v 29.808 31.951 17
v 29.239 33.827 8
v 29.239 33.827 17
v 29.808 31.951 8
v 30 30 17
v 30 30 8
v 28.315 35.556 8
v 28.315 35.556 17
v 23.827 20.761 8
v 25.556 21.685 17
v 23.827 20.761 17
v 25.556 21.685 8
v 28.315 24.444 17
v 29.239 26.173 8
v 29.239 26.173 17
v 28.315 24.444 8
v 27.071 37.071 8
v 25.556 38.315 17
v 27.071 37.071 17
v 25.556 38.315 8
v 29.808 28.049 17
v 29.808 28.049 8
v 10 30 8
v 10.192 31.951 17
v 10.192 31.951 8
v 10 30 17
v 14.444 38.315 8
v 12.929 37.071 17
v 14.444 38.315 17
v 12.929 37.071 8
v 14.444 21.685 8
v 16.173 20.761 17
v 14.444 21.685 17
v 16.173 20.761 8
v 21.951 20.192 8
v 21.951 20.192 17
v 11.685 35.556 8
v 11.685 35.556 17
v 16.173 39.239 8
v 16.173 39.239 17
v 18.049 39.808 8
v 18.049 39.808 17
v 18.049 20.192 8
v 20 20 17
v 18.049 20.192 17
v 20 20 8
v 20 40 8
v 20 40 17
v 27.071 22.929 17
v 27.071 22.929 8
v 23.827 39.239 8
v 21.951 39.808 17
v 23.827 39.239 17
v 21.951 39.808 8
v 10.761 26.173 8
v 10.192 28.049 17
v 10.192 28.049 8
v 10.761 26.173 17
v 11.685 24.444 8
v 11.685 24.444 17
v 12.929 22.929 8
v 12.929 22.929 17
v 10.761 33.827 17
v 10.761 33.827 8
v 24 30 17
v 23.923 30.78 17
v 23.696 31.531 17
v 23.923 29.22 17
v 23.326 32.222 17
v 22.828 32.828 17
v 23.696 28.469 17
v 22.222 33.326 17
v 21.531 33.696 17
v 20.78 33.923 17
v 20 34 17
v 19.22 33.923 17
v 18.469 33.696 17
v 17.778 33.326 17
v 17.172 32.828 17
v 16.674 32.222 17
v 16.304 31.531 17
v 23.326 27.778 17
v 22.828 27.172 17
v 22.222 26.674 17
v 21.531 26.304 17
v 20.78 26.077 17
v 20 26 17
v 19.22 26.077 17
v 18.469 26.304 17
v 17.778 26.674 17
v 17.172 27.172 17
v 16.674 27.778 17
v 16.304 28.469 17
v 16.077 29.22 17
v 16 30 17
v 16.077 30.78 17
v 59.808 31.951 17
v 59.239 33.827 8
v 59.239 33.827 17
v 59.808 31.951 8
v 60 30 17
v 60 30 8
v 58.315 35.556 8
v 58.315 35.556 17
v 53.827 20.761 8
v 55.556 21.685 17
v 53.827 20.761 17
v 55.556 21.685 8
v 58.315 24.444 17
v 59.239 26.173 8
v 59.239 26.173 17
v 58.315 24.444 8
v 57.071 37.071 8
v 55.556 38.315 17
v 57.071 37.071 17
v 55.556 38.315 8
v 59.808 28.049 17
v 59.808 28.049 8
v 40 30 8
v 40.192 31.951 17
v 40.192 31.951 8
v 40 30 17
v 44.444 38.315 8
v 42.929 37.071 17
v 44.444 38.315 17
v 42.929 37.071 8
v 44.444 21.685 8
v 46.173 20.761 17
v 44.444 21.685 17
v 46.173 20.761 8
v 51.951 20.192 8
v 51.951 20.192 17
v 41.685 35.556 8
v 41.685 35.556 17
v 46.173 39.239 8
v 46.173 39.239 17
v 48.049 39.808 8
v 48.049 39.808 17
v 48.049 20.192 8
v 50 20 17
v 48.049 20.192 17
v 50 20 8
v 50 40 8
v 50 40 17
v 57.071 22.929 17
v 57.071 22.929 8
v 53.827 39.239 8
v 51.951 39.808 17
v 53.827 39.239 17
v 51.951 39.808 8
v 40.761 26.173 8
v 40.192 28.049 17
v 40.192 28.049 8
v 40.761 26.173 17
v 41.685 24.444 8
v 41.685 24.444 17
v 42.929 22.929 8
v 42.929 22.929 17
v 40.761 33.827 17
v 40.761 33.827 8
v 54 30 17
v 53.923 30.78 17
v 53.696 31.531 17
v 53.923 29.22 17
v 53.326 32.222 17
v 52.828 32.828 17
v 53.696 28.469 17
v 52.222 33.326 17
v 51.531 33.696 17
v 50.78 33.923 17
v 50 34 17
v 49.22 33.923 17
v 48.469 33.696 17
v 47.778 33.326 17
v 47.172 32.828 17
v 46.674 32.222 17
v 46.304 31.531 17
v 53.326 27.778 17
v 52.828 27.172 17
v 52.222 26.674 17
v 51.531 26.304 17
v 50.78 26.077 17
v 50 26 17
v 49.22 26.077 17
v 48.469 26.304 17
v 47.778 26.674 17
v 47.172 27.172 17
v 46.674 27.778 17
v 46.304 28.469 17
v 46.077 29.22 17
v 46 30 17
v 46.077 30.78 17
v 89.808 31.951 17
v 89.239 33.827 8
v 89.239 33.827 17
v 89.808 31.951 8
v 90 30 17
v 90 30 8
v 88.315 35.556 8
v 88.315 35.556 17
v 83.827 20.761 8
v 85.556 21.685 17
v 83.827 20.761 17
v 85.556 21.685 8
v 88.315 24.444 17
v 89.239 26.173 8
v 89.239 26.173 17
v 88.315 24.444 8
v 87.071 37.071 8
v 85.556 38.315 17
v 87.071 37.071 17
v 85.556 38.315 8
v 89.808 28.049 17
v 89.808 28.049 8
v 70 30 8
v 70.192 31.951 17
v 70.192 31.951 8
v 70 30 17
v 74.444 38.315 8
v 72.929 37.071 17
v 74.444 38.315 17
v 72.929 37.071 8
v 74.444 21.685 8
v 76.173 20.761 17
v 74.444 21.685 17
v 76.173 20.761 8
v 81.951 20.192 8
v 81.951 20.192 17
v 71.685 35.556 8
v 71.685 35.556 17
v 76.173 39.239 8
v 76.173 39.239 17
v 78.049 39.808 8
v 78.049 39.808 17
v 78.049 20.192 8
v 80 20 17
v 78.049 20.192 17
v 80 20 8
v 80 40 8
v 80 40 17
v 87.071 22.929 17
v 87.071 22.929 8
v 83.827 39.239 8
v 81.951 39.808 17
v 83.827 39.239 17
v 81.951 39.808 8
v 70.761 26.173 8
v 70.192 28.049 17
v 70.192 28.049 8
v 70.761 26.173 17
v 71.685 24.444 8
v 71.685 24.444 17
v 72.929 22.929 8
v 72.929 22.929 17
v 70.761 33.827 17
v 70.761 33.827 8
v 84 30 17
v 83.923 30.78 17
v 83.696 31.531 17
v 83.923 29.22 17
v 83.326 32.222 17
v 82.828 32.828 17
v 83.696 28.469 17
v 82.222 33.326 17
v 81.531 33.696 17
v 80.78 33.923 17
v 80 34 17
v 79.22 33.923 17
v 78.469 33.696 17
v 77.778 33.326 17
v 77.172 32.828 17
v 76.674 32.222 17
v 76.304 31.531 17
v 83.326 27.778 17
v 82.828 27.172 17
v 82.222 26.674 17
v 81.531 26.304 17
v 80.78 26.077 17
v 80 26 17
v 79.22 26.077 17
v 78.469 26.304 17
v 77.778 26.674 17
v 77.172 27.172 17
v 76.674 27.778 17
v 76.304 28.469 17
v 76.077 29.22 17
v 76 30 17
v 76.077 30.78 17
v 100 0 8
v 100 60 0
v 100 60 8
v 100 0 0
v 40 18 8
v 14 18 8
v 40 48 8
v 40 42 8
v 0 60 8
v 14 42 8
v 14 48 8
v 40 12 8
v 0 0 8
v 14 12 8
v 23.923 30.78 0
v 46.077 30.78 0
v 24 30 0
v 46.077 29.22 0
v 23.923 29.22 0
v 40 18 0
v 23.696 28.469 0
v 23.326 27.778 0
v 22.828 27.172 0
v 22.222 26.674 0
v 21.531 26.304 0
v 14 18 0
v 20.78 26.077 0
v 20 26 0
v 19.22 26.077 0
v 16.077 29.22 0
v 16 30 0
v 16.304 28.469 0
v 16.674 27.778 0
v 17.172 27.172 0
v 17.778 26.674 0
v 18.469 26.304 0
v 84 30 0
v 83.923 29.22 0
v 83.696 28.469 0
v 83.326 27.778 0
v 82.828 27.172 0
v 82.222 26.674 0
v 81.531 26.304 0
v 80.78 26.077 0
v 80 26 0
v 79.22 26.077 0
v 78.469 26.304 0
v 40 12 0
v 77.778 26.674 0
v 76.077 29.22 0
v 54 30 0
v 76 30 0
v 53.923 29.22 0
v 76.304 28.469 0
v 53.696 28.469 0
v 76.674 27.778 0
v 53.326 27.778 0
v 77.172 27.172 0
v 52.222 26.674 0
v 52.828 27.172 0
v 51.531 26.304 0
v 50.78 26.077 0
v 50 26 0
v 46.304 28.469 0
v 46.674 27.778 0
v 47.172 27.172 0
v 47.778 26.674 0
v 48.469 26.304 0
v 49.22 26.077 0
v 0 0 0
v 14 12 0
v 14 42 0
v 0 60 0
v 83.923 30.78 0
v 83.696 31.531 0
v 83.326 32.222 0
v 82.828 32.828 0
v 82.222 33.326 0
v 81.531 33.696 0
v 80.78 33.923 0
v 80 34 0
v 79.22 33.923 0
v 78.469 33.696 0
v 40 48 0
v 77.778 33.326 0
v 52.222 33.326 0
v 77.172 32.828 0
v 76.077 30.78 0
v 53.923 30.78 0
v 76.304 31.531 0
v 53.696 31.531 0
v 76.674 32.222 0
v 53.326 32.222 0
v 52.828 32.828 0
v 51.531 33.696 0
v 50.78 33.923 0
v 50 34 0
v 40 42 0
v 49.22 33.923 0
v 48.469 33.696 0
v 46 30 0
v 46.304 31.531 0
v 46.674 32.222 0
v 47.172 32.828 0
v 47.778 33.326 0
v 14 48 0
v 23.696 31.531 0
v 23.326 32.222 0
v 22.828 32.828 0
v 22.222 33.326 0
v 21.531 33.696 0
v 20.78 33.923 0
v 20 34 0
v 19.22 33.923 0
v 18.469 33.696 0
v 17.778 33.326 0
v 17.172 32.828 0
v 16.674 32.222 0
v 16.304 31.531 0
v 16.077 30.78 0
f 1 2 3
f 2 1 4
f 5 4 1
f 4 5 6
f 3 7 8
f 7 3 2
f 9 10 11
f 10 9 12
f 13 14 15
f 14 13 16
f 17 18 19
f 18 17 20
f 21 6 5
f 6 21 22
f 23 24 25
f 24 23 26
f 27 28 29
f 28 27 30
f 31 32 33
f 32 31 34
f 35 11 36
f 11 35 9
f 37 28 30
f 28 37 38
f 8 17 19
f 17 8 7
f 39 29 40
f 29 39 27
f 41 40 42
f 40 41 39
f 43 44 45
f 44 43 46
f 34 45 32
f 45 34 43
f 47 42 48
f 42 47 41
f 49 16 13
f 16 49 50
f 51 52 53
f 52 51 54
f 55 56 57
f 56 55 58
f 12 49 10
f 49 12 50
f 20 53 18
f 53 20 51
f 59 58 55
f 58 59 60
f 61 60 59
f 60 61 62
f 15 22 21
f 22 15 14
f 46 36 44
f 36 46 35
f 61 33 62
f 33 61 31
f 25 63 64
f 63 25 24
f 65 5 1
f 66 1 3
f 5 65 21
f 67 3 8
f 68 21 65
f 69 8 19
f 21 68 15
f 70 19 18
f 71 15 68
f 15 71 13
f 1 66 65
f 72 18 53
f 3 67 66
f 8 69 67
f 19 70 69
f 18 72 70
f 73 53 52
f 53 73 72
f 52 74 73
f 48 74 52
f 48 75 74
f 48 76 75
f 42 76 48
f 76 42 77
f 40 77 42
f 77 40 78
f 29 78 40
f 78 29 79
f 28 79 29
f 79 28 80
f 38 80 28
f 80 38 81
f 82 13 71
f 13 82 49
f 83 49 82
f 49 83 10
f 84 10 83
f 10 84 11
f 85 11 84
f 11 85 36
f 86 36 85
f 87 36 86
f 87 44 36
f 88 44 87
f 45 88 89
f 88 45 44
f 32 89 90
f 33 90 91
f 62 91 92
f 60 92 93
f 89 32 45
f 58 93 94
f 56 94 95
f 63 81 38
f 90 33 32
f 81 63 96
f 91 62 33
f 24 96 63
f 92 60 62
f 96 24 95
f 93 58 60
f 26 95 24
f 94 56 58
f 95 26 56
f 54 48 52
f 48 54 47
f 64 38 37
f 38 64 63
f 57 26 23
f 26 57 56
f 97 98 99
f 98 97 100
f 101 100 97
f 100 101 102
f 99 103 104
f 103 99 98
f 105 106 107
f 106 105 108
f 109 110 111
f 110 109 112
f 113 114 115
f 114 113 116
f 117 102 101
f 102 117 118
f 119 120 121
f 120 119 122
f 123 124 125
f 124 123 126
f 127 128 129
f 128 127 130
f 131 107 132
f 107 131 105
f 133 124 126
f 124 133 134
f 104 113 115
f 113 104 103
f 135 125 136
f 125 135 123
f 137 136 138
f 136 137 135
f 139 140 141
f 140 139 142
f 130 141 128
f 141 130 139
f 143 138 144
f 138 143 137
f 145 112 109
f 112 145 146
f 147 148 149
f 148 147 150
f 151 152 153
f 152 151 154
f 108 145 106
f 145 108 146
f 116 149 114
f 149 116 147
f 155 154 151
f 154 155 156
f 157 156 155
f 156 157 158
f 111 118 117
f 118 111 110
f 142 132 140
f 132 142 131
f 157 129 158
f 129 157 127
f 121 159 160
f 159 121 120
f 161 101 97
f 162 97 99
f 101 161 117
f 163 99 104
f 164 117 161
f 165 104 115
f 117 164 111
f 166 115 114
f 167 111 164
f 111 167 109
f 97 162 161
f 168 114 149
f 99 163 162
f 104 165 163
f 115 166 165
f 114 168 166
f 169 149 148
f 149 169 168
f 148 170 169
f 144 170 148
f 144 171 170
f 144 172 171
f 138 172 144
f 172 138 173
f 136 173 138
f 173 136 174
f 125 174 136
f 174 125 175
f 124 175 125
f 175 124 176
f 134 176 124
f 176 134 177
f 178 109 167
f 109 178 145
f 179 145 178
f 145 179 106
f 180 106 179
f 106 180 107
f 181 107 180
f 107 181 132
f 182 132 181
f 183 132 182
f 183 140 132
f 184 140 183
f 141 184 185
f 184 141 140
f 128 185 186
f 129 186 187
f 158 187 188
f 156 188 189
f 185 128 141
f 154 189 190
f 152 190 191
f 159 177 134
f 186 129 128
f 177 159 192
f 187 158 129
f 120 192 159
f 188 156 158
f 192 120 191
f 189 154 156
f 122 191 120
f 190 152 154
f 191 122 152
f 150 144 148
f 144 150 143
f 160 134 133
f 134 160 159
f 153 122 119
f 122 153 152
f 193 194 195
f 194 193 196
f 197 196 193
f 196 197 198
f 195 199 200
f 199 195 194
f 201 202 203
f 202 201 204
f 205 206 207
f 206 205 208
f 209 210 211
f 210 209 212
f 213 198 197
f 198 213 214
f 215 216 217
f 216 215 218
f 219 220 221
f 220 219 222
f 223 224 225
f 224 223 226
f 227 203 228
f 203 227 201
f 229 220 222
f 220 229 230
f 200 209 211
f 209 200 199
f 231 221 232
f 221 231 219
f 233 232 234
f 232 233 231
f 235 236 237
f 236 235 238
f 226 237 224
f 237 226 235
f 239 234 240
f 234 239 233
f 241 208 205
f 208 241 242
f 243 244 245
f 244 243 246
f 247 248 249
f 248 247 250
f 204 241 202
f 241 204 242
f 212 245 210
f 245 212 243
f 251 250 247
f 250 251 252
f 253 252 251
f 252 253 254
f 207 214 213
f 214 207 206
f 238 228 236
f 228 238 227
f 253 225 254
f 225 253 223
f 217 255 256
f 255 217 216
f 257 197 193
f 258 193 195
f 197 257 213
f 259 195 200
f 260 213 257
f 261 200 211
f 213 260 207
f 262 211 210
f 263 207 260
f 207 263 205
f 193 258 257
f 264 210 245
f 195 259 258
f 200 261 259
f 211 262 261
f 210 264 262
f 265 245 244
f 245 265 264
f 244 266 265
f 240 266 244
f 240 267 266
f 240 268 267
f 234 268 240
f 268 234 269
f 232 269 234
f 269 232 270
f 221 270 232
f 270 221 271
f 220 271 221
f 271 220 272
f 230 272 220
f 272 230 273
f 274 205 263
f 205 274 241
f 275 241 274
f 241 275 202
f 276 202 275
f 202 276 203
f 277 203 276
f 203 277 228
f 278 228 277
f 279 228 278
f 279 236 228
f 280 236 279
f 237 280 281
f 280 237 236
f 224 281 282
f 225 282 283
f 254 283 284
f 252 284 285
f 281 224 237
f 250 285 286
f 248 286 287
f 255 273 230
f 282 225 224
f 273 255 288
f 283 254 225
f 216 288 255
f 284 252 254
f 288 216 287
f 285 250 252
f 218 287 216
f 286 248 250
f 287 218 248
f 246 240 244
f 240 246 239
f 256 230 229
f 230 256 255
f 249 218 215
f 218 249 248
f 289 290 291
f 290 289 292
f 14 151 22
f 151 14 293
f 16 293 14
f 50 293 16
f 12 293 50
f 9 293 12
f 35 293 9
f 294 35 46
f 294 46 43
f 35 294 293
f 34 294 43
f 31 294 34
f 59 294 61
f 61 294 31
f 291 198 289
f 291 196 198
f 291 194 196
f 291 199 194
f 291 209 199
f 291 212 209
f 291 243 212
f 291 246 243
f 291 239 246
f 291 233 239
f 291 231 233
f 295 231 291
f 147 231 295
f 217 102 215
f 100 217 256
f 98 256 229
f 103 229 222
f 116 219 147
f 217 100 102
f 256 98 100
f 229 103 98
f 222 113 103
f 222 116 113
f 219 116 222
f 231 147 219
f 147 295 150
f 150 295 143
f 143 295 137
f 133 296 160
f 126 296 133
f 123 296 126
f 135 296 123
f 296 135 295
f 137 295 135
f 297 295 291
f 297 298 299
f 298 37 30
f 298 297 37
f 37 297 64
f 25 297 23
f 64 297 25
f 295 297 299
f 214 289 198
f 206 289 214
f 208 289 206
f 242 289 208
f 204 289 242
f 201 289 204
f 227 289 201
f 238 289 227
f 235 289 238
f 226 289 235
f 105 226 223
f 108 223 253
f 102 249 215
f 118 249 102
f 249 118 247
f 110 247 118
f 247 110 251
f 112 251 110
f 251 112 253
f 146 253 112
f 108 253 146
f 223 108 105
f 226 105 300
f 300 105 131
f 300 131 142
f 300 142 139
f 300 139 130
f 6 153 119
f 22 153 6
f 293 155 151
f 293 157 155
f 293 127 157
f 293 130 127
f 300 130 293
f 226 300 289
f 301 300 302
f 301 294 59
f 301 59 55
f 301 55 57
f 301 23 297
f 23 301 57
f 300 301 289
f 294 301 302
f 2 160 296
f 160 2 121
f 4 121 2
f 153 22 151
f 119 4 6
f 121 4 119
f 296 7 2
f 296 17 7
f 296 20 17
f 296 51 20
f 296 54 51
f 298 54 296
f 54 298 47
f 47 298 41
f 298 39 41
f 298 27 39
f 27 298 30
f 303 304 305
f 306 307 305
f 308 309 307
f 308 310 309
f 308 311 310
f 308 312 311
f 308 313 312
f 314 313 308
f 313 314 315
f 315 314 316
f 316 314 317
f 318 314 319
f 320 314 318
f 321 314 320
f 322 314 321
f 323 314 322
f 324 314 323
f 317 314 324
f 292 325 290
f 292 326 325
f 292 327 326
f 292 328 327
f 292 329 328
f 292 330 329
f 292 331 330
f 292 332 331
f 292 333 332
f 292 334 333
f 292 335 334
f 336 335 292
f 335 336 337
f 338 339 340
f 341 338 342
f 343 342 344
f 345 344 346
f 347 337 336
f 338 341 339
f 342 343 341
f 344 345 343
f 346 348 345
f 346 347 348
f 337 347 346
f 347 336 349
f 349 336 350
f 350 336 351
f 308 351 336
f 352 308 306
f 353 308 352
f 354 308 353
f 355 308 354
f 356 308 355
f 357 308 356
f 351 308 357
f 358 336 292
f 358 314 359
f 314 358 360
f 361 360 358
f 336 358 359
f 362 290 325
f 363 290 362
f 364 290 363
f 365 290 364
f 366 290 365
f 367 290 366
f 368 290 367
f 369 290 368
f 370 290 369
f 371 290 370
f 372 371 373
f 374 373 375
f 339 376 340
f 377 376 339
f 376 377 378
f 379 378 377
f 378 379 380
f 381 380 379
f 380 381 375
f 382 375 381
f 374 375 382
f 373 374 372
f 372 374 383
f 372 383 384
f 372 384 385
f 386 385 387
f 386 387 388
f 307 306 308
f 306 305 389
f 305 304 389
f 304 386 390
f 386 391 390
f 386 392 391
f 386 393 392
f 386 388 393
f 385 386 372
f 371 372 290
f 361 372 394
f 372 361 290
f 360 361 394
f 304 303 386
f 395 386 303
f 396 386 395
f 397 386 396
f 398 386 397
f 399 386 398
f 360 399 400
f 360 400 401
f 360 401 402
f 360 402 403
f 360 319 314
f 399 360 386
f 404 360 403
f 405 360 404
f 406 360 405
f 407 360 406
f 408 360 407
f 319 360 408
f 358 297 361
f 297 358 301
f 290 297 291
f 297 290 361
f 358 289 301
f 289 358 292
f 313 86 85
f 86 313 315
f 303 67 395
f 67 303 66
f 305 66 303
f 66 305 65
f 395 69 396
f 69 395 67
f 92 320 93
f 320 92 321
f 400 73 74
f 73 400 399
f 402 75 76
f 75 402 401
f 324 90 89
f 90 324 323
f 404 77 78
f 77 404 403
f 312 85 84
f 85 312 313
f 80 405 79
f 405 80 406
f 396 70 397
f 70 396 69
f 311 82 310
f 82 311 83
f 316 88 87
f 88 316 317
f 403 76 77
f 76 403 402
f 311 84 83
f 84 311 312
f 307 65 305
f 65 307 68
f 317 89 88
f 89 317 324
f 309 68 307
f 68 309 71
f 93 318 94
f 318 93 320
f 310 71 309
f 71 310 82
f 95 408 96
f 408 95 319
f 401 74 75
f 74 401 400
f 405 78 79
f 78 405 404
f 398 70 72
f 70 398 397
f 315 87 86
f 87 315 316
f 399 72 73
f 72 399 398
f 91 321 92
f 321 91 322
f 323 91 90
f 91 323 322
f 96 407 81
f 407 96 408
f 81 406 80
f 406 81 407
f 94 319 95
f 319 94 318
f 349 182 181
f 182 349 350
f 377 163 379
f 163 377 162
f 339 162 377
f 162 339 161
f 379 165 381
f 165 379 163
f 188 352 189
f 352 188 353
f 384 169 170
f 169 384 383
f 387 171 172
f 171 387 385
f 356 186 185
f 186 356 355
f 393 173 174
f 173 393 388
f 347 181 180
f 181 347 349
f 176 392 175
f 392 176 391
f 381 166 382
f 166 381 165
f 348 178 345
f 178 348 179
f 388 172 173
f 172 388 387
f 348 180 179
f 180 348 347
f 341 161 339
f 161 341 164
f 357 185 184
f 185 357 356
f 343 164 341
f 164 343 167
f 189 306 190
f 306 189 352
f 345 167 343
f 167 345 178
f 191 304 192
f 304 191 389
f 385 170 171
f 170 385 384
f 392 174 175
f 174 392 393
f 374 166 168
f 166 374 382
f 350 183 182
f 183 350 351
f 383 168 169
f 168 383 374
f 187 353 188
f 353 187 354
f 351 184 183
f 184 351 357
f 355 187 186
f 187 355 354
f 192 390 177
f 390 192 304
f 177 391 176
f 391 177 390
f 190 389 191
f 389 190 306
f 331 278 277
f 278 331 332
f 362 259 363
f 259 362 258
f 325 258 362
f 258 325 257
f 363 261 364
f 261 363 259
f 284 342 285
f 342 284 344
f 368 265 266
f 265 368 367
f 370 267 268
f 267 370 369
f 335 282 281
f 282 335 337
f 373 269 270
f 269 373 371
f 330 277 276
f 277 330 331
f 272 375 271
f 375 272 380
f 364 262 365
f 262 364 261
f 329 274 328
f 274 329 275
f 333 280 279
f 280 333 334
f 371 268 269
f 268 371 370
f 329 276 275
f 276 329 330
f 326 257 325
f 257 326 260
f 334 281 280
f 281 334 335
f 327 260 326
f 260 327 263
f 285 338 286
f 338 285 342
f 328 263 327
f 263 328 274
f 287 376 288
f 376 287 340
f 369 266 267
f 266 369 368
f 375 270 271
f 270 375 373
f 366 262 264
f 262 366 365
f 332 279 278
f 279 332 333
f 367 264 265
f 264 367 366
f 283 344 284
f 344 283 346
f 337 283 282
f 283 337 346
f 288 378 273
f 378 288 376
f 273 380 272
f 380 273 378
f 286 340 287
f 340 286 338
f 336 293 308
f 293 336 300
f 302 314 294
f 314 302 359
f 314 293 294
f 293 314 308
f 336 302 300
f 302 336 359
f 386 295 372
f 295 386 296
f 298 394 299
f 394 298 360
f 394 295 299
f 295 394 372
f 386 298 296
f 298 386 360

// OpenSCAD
$fn = 32;

// ----------------------------------------------------------------------
// Drill jig: three_boss_slot jig
// ----------------------------------------------------------------------

// --- parameters (mm) ---
plate_l = 100;            // plate length, X
plate_w = 60;             // plate width, Y
plate_t = 8;              // plate thickness
boss_d = 20;              // guide boss diameter
boss_h = 10;              // boss height above the plate
guide_d = 8;              // guide hole diameter
boss_pitch = 30;          // boss pitch
slot_w = 6;               // clamp slot width
slot_l = 26;              // clamp slot length
slot_x = 14;              // slot start X

n_boss = 3;  // guide bosses
boss_x0 = (plate_l - (n_boss - 1) * boss_pitch) / 2;  // first boss X
boss_top = plate_t - 1 + boss_h;  // boss crown height
total_h = boss_top;  // overall height

difference() {
  union() {
  cube([plate_l, plate_w, plate_t]);
  for (i = [0 : n_boss - 1])
    translate([boss_x0 + i * boss_pitch, plate_w / 2, plate_t - 1])
      cylinder(h = boss_h, d = boss_d);
  }
  for (i = [0 : n_boss - 1])
    translate([boss_x0 + i * boss_pitch, plate_w / 2, -1])
      cylinder(h = plate_t + boss_h, d = guide_d);
  for (cy = [plate_w * 0.25, plate_w * 0.75])
    translate([slot_x, cy - slot_w / 2, -1])
      cube([slot_l, slot_w, plate_t + 2]);
}
